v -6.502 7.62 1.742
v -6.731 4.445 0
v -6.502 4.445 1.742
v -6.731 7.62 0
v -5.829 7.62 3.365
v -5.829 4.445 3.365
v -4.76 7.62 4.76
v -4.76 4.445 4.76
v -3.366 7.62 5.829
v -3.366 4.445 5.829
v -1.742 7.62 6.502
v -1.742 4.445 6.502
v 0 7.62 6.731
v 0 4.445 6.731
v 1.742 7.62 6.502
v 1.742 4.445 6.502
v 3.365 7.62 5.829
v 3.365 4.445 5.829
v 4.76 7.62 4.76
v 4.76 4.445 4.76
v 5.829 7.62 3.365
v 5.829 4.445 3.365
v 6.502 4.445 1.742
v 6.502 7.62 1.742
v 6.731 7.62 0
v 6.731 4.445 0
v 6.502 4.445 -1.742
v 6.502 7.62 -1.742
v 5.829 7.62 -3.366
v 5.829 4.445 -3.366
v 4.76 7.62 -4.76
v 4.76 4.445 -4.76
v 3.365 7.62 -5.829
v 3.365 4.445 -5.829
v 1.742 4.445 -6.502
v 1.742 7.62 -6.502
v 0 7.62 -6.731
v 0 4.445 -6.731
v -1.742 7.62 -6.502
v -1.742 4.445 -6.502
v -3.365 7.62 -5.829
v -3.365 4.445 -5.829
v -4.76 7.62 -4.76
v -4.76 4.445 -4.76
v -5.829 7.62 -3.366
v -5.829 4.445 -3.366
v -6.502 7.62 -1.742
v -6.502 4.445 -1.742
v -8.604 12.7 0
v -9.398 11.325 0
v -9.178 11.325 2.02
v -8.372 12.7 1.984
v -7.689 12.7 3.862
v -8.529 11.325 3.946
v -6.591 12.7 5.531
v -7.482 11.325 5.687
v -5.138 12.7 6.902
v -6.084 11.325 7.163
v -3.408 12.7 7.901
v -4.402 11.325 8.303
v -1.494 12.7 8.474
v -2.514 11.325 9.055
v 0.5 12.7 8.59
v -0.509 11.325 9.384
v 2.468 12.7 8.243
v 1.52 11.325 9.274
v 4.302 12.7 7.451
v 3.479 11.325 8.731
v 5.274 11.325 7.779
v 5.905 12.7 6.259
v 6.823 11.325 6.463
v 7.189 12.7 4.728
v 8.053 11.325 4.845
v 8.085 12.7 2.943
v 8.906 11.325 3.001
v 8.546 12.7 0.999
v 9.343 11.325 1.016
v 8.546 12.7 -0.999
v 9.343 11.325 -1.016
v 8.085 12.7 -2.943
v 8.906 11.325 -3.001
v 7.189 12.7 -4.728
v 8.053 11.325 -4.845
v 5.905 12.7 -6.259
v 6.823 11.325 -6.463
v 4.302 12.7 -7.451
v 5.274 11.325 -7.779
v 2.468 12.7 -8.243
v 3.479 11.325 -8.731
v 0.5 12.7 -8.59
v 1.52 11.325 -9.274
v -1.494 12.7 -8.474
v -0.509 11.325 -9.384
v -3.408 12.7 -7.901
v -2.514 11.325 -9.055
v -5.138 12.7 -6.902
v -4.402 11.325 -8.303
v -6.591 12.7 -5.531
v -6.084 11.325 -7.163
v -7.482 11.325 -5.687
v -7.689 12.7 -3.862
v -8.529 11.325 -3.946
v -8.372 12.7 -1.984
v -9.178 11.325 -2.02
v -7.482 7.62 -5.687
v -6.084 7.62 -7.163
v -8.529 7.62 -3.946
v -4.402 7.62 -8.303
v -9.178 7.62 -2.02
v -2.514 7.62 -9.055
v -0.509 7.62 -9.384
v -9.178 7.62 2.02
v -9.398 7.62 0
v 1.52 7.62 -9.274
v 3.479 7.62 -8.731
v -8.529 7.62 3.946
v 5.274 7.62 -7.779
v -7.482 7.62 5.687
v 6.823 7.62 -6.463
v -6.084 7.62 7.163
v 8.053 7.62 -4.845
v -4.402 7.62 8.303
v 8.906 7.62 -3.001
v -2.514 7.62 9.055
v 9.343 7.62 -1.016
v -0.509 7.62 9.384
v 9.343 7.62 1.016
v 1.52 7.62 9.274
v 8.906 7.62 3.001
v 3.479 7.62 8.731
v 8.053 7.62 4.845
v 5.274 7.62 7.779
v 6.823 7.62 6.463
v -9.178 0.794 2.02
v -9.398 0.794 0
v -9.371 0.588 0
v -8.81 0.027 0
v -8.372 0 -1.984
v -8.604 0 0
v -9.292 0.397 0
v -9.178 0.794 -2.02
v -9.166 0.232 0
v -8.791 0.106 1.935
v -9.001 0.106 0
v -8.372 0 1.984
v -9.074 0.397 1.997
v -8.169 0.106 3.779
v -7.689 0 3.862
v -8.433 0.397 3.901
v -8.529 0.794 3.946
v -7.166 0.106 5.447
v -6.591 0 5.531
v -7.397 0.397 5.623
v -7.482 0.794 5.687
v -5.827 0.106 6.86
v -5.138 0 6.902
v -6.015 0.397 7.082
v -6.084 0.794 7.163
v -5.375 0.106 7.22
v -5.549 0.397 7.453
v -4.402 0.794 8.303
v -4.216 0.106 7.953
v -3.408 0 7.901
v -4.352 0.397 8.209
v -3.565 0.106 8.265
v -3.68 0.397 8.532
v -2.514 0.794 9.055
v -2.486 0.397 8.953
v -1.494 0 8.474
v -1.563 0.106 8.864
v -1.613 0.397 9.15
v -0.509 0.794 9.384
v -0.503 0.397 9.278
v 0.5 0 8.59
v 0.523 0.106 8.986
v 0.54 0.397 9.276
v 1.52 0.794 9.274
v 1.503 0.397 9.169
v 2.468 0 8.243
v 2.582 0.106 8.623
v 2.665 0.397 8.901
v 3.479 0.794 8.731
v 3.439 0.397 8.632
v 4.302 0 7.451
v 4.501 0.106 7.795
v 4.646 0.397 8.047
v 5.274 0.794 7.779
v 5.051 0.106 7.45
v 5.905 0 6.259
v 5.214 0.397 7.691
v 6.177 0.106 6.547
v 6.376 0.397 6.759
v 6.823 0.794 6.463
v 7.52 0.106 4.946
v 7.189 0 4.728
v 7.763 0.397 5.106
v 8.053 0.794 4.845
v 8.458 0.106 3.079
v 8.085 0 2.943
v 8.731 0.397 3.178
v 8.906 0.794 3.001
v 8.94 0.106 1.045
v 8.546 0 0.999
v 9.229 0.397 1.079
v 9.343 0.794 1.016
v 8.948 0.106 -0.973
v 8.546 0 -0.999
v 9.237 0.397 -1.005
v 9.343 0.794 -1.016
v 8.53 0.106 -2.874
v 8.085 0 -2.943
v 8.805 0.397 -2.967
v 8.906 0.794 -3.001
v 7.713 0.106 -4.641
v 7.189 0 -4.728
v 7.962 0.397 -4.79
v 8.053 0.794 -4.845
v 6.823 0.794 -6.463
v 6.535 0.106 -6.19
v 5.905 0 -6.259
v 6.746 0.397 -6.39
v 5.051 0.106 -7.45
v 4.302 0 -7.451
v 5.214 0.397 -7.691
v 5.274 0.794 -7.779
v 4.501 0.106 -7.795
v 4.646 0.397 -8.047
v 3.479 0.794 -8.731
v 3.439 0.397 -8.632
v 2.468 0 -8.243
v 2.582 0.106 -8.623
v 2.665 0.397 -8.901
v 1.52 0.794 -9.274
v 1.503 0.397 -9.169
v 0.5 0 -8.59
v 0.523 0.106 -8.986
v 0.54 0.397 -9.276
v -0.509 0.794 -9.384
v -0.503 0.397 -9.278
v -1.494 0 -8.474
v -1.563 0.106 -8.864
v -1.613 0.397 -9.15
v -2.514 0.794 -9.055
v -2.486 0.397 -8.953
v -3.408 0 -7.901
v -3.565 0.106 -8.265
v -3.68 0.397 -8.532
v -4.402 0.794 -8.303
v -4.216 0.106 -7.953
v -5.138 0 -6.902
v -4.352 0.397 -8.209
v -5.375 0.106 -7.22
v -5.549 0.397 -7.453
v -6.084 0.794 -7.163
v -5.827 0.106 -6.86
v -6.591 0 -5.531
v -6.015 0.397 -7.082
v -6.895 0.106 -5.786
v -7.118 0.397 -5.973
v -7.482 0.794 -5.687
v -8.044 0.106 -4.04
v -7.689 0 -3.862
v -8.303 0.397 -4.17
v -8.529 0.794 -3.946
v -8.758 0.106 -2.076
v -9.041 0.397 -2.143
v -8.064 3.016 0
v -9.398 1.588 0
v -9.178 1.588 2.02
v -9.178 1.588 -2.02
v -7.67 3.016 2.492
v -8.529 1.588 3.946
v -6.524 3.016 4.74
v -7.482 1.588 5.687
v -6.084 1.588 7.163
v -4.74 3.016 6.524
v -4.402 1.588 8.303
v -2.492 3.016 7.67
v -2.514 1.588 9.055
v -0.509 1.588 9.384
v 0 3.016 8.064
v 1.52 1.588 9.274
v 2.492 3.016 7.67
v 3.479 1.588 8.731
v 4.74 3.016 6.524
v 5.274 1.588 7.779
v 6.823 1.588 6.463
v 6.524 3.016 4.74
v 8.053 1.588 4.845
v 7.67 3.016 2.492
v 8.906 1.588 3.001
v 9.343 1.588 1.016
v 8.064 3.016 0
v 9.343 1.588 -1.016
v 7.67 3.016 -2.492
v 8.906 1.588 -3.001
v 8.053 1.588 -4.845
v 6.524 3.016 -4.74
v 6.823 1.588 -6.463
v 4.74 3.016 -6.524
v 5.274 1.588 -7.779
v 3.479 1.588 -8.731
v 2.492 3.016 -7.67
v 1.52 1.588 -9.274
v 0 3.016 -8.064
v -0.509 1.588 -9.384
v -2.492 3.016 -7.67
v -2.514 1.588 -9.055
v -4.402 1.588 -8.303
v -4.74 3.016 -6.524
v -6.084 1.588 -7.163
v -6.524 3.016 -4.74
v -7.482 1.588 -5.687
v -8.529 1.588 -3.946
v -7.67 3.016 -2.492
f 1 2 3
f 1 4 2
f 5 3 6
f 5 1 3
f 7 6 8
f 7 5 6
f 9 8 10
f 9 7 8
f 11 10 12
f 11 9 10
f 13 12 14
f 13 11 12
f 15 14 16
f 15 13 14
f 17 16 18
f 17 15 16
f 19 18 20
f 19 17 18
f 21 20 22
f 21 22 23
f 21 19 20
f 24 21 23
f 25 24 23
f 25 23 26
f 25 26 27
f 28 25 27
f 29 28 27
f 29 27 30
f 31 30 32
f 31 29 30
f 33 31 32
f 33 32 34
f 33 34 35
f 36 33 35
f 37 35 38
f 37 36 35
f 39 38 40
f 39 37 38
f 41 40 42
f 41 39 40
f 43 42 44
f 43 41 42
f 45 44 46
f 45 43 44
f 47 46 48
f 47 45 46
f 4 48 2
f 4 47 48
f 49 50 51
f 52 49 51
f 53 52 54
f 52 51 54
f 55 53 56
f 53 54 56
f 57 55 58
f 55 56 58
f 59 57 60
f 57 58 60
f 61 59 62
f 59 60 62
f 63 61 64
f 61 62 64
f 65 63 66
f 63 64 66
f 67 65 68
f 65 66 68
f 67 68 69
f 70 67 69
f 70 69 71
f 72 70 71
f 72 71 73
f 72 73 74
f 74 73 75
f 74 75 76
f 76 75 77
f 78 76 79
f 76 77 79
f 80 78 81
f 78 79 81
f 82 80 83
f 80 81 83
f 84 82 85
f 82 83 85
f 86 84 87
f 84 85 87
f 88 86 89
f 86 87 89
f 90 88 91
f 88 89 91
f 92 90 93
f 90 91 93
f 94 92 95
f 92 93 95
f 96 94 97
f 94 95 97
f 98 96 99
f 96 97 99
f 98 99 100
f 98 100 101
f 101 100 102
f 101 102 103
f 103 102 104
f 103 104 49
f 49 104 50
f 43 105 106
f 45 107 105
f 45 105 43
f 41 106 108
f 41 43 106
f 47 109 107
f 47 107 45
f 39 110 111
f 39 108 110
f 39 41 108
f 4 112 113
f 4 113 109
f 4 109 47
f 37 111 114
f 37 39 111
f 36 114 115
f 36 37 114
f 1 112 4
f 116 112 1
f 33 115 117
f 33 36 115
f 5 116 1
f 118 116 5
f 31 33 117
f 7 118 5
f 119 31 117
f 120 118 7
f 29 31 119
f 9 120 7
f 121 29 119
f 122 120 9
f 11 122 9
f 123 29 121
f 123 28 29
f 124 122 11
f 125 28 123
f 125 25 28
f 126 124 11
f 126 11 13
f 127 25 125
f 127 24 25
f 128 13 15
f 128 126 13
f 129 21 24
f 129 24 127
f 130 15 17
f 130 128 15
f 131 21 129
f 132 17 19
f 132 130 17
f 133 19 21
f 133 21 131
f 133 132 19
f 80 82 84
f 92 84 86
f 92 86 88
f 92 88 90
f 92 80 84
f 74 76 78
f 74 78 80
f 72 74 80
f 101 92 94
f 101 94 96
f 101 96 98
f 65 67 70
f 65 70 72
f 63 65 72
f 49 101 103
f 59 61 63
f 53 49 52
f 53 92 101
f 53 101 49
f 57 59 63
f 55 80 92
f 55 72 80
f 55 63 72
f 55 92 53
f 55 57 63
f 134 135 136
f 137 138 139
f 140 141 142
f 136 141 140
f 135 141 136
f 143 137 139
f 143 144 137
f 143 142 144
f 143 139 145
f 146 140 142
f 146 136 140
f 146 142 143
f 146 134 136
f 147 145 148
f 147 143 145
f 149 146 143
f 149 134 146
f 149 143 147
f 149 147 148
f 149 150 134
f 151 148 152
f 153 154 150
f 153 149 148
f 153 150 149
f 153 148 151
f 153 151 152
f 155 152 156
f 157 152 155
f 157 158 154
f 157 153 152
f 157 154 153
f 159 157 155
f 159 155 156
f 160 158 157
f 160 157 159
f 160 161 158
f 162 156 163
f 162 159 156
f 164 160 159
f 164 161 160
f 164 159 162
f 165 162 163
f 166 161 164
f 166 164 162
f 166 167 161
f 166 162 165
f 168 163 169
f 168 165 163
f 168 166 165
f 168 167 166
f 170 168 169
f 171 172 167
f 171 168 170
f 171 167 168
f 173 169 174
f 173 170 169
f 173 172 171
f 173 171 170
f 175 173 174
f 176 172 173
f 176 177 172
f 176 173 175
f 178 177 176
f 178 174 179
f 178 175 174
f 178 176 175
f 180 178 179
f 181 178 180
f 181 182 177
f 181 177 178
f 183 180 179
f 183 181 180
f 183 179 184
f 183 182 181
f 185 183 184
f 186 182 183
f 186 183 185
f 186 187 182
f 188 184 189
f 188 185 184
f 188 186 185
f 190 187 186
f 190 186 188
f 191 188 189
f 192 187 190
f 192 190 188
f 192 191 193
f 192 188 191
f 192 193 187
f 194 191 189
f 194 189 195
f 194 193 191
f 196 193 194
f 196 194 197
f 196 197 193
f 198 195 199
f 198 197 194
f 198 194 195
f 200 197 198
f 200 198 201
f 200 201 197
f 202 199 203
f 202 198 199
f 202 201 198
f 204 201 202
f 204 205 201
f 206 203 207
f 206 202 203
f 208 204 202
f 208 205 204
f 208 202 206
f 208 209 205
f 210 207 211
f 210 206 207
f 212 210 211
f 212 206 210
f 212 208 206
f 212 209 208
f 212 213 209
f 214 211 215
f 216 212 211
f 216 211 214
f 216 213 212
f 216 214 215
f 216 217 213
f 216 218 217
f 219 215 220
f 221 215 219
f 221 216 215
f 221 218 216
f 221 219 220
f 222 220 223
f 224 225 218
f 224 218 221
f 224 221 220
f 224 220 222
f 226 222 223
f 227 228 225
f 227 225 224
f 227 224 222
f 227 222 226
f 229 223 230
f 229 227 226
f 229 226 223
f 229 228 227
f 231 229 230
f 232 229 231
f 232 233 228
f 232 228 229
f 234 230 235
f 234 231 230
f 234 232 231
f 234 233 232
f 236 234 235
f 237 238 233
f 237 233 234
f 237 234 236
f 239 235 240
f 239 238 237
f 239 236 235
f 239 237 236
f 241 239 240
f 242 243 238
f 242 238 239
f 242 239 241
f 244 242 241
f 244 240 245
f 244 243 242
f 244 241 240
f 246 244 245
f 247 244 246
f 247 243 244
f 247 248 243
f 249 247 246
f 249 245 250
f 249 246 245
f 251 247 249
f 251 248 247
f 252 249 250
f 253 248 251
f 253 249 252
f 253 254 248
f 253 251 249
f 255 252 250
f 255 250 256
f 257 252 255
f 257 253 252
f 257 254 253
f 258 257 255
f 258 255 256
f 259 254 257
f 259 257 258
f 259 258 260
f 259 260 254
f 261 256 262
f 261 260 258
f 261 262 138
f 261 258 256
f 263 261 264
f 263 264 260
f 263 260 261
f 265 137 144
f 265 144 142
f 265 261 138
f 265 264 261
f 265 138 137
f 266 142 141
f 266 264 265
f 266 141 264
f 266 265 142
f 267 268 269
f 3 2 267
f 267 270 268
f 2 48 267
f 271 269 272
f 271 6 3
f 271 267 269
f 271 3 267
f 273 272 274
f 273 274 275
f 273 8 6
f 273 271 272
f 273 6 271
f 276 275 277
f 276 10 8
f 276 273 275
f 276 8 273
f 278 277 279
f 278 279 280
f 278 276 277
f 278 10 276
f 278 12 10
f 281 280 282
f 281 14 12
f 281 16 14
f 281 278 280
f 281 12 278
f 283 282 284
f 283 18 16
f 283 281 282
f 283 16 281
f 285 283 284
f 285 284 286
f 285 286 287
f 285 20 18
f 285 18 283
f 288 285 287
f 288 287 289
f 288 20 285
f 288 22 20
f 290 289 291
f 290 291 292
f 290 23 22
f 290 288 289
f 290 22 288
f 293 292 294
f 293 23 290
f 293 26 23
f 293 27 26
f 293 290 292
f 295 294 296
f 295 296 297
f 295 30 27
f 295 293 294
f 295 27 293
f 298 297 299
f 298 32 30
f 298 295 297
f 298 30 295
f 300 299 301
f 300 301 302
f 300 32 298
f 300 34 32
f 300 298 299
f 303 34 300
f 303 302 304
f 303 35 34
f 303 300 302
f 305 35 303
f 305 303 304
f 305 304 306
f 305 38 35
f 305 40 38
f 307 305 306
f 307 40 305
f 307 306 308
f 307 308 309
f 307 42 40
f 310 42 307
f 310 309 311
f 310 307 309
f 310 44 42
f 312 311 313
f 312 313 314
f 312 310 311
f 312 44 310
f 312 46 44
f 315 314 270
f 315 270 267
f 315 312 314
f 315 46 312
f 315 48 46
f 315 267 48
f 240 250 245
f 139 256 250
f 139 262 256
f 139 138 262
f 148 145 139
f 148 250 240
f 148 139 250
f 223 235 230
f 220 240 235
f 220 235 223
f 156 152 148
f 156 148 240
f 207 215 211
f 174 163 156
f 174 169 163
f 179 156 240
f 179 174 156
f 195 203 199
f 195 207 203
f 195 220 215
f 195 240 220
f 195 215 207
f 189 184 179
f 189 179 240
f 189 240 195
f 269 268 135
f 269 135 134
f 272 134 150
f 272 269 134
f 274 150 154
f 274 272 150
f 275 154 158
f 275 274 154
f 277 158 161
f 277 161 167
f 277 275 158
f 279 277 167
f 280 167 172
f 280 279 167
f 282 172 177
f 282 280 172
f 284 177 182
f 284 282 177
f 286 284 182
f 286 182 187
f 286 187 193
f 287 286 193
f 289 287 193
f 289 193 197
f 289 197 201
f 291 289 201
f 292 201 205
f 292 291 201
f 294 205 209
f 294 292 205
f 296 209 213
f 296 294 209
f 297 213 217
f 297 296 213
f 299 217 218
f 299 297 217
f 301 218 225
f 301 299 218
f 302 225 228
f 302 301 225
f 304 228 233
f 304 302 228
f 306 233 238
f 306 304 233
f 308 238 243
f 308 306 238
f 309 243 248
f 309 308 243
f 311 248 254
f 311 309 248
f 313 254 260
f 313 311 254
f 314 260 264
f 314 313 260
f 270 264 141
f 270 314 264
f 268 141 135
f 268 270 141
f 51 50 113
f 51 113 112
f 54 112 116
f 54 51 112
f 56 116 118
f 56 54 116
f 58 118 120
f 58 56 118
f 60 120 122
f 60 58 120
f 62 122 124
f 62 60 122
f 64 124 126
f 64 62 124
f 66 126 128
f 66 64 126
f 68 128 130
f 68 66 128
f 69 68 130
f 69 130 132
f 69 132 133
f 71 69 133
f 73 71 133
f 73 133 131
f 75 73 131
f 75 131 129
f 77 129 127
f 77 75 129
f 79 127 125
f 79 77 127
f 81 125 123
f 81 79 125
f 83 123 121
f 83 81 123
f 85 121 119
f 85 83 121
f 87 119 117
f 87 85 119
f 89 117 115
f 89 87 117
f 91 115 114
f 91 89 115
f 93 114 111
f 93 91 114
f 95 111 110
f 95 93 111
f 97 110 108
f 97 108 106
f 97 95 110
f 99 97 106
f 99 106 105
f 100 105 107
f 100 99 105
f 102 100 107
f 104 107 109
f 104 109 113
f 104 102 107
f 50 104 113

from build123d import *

# Parameters (mm, degrees)
FILLET1_R      = 0.79375
CHAMFER1_SIZE  = 0.79375
CHAMFER1_SIZE2 = 1.374815329


with BuildPart() as part:
    # Sketch1 → Revolve1 (revolve)
    with BuildSketch(Plane.XY):
        Polygon((0, 0), (-9.398, 0), (-9.398, 1.5875), (-6.731, 4.445), (-6.731, 7.62), (-9.398, 7.62), (-9.398, 12.7), (0, 12.7), align=None)
    revolve(axis=Axis((0, 0, 0), (0, 1, 0)))

    # Fillet1
    fillet1_edges = [part.edges().sort_by_distance(p)[0] for p in [
        (9.398, 0, 0),
    ]]
    fillet(fillet1_edges, radius=FILLET1_R)

    # Chamfer1
    chamfer1_edges = [part.edges().sort_by_distance(p)[0] for p in [
        (9.398, 12.7, 0),
    ]]
    chamfer1_side = [part.faces().sort_by_distance(p)[0] for p in [
        (0, 12.7, 0),
    ]]
    chamfer(chamfer1_edges, length=CHAMFER1_SIZE, length2=CHAMFER1_SIZE2, reference=chamfer1_side[0])


solid = part.part
